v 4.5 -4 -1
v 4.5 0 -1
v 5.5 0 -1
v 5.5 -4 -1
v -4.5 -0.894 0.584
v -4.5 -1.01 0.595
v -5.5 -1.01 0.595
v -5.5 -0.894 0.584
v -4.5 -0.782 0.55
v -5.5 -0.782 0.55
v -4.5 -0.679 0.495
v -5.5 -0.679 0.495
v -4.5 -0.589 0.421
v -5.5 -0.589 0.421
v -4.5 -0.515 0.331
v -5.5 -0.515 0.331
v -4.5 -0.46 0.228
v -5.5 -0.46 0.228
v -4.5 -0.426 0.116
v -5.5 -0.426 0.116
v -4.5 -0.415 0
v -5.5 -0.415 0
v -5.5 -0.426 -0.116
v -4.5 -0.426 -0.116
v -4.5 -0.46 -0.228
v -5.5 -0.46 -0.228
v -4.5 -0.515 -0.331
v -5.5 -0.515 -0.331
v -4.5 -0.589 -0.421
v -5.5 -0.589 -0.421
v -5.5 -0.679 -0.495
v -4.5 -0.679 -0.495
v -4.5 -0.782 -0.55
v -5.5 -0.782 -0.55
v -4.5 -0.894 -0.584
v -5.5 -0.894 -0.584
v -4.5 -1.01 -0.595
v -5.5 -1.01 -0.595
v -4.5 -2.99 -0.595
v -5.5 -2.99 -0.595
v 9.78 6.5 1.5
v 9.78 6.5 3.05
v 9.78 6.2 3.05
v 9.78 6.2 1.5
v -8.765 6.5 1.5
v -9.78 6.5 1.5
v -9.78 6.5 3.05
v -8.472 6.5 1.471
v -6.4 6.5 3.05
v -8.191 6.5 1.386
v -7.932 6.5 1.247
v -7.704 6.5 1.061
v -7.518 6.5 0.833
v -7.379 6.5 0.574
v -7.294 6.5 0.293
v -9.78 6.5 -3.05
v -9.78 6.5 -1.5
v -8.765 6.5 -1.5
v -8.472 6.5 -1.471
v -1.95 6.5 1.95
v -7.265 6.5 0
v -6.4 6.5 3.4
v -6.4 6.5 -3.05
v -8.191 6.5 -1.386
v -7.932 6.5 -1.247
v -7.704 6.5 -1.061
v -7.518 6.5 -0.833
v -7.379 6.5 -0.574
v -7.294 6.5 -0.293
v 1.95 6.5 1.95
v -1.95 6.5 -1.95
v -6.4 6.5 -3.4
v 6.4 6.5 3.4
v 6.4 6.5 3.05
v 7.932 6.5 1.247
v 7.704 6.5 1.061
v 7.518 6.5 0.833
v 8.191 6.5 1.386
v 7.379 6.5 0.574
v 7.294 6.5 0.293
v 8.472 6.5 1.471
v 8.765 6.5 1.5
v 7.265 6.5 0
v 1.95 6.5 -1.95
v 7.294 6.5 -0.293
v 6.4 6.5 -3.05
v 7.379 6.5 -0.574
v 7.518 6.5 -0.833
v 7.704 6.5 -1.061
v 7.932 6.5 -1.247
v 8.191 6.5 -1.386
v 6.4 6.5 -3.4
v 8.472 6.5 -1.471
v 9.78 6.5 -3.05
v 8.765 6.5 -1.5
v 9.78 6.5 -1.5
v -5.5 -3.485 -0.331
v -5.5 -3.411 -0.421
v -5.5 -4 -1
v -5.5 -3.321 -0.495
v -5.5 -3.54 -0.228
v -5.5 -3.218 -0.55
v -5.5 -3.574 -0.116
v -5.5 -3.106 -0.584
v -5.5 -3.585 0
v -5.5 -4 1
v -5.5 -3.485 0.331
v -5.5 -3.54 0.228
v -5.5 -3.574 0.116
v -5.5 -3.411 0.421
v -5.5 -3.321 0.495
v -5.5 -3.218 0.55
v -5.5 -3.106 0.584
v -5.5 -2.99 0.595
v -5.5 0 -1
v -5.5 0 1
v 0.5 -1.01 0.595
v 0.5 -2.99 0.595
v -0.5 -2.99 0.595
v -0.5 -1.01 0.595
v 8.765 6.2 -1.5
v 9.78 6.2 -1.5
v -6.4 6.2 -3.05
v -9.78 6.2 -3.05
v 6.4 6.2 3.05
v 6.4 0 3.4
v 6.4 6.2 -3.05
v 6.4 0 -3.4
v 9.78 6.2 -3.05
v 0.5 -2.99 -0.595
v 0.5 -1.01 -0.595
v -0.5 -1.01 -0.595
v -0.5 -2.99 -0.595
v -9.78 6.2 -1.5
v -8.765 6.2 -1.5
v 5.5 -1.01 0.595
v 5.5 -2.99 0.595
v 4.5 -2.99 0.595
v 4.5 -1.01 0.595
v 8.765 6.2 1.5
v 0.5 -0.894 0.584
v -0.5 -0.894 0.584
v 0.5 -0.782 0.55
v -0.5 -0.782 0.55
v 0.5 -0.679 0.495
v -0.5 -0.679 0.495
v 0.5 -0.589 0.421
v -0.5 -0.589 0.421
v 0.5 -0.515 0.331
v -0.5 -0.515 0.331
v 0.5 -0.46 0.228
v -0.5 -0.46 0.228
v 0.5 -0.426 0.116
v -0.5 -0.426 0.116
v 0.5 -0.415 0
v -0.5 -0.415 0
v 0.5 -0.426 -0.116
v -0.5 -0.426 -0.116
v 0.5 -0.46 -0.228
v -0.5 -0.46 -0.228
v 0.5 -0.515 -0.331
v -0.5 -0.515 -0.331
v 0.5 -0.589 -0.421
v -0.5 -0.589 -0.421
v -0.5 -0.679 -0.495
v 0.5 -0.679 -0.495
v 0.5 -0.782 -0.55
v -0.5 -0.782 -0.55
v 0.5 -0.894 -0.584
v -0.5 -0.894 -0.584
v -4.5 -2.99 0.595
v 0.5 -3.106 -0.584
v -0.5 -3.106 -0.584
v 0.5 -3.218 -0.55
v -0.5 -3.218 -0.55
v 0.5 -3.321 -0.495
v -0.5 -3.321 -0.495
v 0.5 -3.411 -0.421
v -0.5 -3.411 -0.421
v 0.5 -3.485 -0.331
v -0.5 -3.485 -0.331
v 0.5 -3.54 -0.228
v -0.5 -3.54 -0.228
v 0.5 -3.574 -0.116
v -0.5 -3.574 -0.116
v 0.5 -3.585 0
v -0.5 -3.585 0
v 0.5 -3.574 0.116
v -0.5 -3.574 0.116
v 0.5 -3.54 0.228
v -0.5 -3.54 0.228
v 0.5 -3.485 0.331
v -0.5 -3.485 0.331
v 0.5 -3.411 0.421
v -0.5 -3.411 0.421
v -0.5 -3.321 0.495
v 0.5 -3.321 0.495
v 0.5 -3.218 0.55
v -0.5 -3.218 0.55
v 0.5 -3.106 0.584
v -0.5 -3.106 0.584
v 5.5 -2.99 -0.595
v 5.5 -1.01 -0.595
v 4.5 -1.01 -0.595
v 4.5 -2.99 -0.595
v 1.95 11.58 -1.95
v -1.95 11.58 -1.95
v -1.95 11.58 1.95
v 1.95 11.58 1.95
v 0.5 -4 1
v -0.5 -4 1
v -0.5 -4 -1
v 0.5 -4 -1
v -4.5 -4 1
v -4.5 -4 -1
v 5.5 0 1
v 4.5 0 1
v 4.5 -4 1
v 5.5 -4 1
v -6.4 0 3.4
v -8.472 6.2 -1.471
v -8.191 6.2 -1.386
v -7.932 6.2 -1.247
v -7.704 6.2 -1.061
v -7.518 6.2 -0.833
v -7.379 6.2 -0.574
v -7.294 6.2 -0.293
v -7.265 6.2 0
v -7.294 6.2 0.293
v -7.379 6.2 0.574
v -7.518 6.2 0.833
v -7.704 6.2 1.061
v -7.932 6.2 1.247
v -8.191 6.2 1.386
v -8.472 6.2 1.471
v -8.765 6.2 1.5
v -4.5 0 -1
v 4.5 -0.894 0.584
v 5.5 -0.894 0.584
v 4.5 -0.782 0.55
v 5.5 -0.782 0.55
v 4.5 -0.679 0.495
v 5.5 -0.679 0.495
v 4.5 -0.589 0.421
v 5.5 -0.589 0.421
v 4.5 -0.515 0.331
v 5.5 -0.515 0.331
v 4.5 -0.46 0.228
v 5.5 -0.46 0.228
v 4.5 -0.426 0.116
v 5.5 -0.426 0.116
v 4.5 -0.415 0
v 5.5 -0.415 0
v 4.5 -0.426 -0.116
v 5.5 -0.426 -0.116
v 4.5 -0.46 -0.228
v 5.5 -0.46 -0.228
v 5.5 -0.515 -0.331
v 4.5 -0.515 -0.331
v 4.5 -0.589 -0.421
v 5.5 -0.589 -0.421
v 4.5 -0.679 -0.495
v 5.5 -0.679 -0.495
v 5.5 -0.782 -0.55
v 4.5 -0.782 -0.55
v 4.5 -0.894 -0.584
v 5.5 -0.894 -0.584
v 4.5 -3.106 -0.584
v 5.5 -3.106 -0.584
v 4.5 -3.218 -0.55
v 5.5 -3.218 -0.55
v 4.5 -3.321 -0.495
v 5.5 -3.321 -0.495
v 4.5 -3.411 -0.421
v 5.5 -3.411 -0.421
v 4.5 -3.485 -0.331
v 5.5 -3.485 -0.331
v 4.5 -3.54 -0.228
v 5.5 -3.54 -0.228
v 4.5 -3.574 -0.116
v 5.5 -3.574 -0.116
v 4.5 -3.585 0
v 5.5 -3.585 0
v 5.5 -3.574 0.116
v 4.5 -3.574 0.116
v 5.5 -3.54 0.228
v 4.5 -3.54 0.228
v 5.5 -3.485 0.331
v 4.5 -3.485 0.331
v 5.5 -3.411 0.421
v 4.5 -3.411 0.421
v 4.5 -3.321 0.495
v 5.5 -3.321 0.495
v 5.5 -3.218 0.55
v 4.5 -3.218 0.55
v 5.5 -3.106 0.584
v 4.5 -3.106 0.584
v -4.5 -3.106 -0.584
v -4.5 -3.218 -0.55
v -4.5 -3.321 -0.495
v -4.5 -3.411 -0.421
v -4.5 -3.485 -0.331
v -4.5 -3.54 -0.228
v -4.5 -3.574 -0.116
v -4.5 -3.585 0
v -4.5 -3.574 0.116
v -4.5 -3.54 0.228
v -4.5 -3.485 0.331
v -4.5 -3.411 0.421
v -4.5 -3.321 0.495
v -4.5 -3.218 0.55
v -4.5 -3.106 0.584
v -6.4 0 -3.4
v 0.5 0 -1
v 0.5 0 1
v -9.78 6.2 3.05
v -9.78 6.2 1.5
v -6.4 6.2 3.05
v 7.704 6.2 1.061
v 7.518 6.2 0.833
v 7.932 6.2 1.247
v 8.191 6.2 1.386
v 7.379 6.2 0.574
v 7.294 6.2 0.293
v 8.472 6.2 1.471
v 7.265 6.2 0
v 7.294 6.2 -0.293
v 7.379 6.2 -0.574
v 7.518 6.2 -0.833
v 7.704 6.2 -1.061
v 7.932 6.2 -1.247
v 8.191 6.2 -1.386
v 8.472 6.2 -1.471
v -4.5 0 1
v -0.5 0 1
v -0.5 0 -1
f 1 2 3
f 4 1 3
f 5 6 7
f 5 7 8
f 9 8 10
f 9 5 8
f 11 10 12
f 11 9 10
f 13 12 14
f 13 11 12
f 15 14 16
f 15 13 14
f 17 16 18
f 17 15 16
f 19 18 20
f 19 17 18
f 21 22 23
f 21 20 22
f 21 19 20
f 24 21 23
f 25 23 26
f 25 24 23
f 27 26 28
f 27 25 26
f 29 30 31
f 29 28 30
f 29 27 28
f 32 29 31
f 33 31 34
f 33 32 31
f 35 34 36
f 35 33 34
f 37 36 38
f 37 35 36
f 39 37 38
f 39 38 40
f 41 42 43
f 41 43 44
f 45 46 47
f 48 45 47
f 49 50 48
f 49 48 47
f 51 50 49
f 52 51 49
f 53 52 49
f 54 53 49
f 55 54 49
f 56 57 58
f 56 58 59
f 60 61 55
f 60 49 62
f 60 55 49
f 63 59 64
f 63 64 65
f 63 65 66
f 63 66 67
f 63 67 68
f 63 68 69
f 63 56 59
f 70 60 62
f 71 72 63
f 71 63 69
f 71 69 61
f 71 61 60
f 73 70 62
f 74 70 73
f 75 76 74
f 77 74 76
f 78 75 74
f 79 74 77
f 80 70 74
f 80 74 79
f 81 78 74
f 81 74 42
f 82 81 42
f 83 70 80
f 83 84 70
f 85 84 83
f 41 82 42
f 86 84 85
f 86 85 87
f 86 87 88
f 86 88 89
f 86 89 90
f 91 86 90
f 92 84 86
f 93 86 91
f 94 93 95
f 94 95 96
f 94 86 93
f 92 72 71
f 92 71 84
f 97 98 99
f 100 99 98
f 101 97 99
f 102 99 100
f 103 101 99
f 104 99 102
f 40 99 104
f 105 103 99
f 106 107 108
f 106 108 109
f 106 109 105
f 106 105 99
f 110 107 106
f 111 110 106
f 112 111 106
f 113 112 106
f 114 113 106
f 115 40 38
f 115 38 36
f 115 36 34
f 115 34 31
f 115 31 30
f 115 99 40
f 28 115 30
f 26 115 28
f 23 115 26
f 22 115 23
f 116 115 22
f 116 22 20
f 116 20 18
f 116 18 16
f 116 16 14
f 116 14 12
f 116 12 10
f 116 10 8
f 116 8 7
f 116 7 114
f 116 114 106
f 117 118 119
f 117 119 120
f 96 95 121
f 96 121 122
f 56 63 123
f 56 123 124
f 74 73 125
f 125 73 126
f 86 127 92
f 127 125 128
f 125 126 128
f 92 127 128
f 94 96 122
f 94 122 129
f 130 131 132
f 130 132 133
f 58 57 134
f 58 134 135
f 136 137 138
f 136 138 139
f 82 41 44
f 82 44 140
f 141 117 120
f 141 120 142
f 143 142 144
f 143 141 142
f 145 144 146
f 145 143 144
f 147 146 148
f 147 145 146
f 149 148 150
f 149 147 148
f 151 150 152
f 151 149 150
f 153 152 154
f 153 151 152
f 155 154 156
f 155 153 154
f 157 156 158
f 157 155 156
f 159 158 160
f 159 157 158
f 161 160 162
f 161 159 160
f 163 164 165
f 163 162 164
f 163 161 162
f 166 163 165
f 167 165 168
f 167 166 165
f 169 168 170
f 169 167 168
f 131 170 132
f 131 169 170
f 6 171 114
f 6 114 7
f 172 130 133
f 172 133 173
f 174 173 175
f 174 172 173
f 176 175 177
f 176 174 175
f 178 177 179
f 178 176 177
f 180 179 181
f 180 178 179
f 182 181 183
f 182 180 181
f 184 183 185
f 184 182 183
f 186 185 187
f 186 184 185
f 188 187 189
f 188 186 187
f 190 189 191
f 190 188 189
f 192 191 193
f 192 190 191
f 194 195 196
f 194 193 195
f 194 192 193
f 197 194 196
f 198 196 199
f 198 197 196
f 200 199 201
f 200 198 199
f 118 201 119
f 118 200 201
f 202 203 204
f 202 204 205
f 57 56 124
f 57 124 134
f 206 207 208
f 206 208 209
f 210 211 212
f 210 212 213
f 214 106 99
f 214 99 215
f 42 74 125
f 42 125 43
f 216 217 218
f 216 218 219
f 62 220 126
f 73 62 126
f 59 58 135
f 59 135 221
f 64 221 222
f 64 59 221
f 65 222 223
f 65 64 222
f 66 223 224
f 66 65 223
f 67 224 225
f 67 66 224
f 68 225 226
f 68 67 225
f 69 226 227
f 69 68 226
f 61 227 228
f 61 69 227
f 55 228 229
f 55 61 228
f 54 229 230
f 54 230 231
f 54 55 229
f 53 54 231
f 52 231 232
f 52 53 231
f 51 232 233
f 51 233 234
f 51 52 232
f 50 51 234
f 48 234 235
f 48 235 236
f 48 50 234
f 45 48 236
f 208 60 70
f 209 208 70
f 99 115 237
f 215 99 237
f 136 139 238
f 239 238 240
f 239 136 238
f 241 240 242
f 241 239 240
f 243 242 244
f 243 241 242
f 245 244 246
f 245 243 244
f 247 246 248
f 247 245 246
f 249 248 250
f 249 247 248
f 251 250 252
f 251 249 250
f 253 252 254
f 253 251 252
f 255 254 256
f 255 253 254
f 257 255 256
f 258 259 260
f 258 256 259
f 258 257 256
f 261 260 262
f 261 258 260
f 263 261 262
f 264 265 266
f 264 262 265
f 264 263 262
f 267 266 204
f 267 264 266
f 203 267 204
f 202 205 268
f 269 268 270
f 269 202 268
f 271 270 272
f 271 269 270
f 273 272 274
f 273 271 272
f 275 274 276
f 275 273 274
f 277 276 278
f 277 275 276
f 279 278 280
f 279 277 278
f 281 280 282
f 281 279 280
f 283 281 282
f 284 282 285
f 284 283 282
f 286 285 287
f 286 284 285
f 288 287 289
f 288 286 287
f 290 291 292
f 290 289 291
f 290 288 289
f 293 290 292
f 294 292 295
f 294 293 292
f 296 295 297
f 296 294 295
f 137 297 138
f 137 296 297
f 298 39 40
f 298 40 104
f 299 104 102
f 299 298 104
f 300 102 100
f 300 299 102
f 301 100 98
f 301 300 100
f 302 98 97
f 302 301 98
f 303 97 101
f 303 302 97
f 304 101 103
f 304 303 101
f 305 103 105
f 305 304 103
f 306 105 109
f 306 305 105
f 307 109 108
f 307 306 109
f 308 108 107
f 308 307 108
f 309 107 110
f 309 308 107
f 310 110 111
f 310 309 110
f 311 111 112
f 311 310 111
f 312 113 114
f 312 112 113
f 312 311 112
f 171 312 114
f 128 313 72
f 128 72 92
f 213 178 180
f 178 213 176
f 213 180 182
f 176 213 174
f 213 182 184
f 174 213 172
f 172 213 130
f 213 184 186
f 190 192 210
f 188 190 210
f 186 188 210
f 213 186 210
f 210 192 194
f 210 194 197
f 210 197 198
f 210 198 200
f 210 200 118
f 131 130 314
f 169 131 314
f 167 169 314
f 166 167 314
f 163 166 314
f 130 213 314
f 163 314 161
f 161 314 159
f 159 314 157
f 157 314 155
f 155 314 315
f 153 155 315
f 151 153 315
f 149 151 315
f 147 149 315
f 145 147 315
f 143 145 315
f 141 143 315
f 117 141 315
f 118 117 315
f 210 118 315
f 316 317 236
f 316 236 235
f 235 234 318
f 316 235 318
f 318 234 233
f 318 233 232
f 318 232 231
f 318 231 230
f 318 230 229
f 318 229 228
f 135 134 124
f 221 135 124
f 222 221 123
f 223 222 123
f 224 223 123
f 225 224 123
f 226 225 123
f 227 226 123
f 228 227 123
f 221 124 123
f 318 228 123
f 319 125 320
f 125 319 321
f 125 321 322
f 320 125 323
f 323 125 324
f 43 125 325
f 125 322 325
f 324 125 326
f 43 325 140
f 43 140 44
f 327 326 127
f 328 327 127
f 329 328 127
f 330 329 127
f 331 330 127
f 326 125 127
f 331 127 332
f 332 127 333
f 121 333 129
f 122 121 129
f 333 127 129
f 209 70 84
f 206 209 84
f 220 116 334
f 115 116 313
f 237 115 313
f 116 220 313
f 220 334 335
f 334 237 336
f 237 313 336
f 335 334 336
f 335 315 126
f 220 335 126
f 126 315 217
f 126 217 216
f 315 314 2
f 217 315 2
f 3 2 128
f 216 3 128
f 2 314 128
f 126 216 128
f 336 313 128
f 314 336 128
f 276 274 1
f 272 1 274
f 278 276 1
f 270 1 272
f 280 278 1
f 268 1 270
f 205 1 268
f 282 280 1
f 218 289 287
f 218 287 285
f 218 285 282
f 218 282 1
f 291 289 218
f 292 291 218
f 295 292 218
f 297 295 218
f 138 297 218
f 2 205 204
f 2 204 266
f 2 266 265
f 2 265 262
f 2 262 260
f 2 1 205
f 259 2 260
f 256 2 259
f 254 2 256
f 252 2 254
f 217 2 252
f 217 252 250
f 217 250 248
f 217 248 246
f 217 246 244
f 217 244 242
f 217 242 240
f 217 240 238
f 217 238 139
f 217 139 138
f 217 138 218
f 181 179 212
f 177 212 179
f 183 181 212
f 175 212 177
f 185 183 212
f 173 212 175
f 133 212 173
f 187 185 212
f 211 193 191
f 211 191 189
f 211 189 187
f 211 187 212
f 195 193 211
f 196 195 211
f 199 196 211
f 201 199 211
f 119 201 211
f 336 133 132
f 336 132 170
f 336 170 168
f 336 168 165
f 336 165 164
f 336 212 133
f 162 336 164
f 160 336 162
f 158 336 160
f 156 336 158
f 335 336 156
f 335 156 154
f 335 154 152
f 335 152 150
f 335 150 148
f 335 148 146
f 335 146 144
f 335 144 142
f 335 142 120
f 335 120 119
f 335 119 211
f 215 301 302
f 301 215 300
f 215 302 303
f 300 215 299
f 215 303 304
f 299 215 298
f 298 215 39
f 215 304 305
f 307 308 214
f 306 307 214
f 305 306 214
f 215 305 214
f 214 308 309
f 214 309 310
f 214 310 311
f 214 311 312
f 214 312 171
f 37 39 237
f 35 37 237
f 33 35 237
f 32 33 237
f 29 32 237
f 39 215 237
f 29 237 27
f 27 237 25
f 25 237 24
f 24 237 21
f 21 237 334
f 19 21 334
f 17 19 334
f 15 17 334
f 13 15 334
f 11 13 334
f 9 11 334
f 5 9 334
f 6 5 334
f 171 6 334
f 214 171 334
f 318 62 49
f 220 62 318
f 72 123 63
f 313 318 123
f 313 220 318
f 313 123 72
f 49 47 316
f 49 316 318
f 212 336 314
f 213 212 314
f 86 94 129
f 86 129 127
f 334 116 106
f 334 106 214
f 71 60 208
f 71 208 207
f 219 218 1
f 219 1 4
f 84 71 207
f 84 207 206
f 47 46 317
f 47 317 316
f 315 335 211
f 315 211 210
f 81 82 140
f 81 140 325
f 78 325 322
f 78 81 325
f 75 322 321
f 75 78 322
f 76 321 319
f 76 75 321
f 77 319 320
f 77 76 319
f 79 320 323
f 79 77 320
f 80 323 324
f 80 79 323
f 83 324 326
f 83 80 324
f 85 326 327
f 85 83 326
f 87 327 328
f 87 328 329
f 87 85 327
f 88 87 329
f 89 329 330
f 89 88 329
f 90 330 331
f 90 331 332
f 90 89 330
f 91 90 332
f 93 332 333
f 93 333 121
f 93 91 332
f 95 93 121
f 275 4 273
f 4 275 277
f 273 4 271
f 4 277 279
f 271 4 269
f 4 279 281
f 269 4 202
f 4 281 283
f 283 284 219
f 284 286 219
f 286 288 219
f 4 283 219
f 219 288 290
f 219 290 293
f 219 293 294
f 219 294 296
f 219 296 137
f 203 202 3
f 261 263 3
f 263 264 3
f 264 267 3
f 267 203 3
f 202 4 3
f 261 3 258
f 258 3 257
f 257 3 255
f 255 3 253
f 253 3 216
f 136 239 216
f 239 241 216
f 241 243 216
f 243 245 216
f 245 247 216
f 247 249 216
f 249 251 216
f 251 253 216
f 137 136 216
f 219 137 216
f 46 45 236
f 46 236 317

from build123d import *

# Parameters (mm, degrees)
SKETCH1_W           = 12.8
SKETCH1_H           = 6.8
BOSS_EXTRUDE1_DEPTH = 6.5
BOSS_EXTRUDE2_DEPTH = 0.3
SKETCH3_W           = 3.9
SKETCH3_H           = 3.9
BOSS_EXTRUDE3_DEPTH = 5.08
SKETCH4_W           = 1
SKETCH4_H           = 2
BOSS_EXTRUDE4_DEPTH = 4
CUT_EXTRUDE1_DEPTH  = 20.471384132


with BuildPart() as part:
    # Sketch1 → Boss-Extrude1 (new body)
    with BuildSketch(Plane(origin=(0, 0, 0), x_dir=(1, 0, 0), z_dir=(0, 1, 0))):
        Rectangle(SKETCH1_W, SKETCH1_H)
    extrude(amount=BOSS_EXTRUDE1_DEPTH)

    # Sketch2 → Boss-Extrude2 (add)
    with BuildSketch(Plane(origin=(0, 6.5, 0), x_dir=(1, 0, 0), z_dir=(0, 1, 0))):
        with BuildLine():
            Line((9.78, 3.05), (-9.78, 3.05))
            Line((-9.78, 3.05), (-9.78, 1.5))
            Line((-9.78, 1.5), (-8.765, 1.5))
            ThreePointArc((-8.765, 1.5), (-7.265, 0), (-8.765, -1.5))
            Line((-8.765, -1.5), (-9.78, -1.5))
            Line((-9.78, -1.5), (-9.78, -3.05))
            Line((-9.78, -3.05), (9.78, -3.05))
            Line((9.78, -3.05), (9.78, -1.5))
            Line((9.78, -1.5), (8.765, -1.5))
            ThreePointArc((8.765, -1.5), (7.265, 0), (8.765, 1.5))
            Line((8.765, 1.5), (9.78, 1.5))
            Line((9.78, 1.5), (9.78, 3.05))
        make_face()
    extrude(amount=-BOSS_EXTRUDE2_DEPTH)

    # Sketch3 → Boss-Extrude3 (add)
    with BuildSketch(Plane(origin=(0, 6.5, 0), x_dir=(1, 0, 0), z_dir=(0, 1, 0))):
        Rectangle(SKETCH3_W, SKETCH3_H)
    extrude(amount=BOSS_EXTRUDE3_DEPTH)

    # Sketch4 → Boss-Extrude4 (add)
    with BuildSketch(Plane.XZ):
        Rectangle(SKETCH4_W, SKETCH4_H)
        with Locations((5, 0)):
            Rectangle(SKETCH4_W, SKETCH4_H)
        with Locations((-5, 0)):
            Rectangle(SKETCH4_W, SKETCH4_H)
    extrude(amount=BOSS_EXTRUDE4_DEPTH)

    # Sketch5 → Cut-Extrude1 (cut, through all)
    with BuildSketch(Plane(origin=(5.5, 0, 0), x_dir=(0, 0, -1), z_dir=(1, 0, 0))):
        with BuildLine():
            Line((0.595, -1.01), (0.595, -2.99))
            ThreePointArc((0.595, -2.99), (0, -3.585), (-0.595, -2.99))
            Line((-0.595, -2.99), (-0.595, -1.01))
            ThreePointArc((-0.595, -1.01), (0, -0.415), (0.595, -1.01))
        make_face()
    extrude(amount=-CUT_EXTRUDE1_DEPTH, mode=Mode.SUBTRACT)


solid = part.part
